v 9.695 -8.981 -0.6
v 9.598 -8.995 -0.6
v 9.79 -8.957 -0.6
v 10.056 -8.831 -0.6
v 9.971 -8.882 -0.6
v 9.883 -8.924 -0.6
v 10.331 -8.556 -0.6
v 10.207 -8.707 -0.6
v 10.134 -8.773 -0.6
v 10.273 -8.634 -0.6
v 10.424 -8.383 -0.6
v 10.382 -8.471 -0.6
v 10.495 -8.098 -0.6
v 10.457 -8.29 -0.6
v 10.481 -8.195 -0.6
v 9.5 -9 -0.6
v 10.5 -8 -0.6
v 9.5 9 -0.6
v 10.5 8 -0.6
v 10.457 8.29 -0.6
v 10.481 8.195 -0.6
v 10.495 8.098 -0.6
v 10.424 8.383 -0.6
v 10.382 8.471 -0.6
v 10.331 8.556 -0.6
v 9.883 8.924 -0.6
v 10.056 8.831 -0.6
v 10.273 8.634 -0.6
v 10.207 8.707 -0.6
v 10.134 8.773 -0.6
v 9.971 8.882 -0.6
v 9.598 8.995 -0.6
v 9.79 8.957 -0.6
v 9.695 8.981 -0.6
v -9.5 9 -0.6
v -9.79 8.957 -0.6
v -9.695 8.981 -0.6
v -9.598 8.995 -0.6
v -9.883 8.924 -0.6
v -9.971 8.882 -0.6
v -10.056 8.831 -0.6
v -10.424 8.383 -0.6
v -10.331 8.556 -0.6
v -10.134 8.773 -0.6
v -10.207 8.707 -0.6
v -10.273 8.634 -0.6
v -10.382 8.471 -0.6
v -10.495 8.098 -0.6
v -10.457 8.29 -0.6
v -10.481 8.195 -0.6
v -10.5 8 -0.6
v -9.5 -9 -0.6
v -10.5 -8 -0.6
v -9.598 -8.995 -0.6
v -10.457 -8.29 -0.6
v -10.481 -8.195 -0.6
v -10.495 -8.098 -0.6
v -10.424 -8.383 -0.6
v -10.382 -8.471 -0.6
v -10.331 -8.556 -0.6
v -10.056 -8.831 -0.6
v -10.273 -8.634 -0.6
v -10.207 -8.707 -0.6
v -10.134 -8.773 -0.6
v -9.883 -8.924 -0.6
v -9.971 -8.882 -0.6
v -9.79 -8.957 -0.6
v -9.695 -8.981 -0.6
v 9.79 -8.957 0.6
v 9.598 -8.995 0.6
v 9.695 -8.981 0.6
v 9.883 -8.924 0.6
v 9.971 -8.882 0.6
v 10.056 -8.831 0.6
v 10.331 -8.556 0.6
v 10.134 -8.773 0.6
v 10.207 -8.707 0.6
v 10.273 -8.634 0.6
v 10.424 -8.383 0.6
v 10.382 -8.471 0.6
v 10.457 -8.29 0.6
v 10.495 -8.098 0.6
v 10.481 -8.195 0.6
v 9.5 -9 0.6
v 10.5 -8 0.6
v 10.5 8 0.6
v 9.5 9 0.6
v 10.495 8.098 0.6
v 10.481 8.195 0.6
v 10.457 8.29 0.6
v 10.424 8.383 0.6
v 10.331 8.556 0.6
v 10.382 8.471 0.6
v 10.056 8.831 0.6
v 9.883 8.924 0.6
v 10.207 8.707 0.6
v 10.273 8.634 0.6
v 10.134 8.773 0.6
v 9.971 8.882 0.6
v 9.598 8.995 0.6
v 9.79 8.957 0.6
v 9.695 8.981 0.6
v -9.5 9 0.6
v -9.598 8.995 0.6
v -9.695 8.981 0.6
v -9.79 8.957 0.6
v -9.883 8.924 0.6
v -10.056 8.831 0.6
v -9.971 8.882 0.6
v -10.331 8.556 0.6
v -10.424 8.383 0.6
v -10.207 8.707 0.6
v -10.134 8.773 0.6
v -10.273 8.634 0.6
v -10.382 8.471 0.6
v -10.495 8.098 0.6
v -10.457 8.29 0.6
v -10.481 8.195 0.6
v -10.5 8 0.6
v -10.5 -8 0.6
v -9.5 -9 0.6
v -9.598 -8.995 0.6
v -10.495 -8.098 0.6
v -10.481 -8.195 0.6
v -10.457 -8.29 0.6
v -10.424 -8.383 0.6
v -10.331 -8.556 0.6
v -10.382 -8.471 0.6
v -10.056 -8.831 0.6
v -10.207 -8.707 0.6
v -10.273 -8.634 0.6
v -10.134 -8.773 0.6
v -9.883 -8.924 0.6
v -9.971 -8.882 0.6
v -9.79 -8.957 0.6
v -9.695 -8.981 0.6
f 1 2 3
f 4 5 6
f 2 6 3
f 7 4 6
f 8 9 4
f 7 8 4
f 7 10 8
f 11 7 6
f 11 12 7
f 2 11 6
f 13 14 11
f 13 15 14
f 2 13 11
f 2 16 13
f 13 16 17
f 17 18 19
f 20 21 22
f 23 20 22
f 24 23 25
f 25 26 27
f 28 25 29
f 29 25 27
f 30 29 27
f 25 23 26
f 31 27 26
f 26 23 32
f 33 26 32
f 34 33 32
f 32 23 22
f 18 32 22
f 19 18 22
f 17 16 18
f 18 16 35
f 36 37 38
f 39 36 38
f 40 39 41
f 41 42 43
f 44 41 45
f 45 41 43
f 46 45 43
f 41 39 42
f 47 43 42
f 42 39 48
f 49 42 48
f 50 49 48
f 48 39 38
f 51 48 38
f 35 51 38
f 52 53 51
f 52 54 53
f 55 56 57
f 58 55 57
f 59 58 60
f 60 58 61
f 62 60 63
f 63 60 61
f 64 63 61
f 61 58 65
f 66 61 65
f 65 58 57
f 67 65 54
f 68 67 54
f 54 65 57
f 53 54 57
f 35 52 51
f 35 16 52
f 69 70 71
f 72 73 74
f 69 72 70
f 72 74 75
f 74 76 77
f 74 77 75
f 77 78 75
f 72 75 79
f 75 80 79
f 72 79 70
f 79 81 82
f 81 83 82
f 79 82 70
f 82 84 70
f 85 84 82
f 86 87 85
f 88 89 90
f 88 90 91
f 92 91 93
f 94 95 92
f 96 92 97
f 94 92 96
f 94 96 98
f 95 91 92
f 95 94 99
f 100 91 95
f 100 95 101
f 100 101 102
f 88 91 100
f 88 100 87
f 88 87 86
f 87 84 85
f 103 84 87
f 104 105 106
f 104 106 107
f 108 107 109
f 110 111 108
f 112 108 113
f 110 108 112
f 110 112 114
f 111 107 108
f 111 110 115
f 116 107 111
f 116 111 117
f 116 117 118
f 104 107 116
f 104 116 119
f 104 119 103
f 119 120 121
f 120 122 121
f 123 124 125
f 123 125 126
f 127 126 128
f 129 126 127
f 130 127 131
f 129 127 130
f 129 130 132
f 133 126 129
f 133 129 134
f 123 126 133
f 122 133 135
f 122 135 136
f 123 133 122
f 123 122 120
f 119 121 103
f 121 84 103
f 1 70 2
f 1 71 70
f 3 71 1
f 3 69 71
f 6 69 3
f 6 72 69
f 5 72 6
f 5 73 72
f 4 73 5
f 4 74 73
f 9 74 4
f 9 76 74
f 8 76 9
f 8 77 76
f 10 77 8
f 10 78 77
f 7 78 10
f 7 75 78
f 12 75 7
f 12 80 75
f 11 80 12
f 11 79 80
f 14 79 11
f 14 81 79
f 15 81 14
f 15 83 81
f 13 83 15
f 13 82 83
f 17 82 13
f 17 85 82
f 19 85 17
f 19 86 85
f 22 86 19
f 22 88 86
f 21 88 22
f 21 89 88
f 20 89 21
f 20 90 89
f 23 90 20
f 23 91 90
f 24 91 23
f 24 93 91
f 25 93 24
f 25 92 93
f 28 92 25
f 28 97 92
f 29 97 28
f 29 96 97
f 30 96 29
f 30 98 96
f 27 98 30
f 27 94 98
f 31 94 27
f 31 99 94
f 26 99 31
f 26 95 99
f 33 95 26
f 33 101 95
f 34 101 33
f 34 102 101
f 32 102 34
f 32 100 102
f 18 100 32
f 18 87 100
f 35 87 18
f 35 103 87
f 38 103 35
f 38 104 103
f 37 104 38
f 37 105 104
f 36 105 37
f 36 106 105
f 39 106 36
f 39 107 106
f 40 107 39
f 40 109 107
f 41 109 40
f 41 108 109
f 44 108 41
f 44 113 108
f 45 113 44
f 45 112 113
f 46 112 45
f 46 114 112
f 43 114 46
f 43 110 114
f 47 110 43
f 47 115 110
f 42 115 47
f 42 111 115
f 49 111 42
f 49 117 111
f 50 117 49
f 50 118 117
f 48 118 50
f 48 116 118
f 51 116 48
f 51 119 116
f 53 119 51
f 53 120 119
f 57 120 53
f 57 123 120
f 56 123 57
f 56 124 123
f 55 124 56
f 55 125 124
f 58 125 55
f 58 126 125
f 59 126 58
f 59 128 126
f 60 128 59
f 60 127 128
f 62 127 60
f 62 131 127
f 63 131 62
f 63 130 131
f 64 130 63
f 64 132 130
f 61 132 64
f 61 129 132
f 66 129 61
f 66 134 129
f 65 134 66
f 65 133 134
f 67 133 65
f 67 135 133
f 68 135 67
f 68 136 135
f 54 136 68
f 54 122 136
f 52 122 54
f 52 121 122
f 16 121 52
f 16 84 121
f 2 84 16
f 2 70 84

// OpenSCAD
// PCB: 21.0mm x 18.0mm x 1.2mm (single connected solid)
$fn = 64;

pcb_L = 21.0;
pcb_W = 18.0;
pcb_T = 1.2;

// Small corner radius to look like a real PCB while keeping exact outer dimensions
corner_r = 1.0;

module rounded_rect_prism(L, W, T, r) {
    linear_extrude(height = T, center = true)
        offset(r = r)
            square([L - 2*r, W - 2*r], center = true);
}

color([0.0, 0.4, 0.2])
rounded_rect_prism(pcb_L, pcb_W, pcb_T, corner_r);
